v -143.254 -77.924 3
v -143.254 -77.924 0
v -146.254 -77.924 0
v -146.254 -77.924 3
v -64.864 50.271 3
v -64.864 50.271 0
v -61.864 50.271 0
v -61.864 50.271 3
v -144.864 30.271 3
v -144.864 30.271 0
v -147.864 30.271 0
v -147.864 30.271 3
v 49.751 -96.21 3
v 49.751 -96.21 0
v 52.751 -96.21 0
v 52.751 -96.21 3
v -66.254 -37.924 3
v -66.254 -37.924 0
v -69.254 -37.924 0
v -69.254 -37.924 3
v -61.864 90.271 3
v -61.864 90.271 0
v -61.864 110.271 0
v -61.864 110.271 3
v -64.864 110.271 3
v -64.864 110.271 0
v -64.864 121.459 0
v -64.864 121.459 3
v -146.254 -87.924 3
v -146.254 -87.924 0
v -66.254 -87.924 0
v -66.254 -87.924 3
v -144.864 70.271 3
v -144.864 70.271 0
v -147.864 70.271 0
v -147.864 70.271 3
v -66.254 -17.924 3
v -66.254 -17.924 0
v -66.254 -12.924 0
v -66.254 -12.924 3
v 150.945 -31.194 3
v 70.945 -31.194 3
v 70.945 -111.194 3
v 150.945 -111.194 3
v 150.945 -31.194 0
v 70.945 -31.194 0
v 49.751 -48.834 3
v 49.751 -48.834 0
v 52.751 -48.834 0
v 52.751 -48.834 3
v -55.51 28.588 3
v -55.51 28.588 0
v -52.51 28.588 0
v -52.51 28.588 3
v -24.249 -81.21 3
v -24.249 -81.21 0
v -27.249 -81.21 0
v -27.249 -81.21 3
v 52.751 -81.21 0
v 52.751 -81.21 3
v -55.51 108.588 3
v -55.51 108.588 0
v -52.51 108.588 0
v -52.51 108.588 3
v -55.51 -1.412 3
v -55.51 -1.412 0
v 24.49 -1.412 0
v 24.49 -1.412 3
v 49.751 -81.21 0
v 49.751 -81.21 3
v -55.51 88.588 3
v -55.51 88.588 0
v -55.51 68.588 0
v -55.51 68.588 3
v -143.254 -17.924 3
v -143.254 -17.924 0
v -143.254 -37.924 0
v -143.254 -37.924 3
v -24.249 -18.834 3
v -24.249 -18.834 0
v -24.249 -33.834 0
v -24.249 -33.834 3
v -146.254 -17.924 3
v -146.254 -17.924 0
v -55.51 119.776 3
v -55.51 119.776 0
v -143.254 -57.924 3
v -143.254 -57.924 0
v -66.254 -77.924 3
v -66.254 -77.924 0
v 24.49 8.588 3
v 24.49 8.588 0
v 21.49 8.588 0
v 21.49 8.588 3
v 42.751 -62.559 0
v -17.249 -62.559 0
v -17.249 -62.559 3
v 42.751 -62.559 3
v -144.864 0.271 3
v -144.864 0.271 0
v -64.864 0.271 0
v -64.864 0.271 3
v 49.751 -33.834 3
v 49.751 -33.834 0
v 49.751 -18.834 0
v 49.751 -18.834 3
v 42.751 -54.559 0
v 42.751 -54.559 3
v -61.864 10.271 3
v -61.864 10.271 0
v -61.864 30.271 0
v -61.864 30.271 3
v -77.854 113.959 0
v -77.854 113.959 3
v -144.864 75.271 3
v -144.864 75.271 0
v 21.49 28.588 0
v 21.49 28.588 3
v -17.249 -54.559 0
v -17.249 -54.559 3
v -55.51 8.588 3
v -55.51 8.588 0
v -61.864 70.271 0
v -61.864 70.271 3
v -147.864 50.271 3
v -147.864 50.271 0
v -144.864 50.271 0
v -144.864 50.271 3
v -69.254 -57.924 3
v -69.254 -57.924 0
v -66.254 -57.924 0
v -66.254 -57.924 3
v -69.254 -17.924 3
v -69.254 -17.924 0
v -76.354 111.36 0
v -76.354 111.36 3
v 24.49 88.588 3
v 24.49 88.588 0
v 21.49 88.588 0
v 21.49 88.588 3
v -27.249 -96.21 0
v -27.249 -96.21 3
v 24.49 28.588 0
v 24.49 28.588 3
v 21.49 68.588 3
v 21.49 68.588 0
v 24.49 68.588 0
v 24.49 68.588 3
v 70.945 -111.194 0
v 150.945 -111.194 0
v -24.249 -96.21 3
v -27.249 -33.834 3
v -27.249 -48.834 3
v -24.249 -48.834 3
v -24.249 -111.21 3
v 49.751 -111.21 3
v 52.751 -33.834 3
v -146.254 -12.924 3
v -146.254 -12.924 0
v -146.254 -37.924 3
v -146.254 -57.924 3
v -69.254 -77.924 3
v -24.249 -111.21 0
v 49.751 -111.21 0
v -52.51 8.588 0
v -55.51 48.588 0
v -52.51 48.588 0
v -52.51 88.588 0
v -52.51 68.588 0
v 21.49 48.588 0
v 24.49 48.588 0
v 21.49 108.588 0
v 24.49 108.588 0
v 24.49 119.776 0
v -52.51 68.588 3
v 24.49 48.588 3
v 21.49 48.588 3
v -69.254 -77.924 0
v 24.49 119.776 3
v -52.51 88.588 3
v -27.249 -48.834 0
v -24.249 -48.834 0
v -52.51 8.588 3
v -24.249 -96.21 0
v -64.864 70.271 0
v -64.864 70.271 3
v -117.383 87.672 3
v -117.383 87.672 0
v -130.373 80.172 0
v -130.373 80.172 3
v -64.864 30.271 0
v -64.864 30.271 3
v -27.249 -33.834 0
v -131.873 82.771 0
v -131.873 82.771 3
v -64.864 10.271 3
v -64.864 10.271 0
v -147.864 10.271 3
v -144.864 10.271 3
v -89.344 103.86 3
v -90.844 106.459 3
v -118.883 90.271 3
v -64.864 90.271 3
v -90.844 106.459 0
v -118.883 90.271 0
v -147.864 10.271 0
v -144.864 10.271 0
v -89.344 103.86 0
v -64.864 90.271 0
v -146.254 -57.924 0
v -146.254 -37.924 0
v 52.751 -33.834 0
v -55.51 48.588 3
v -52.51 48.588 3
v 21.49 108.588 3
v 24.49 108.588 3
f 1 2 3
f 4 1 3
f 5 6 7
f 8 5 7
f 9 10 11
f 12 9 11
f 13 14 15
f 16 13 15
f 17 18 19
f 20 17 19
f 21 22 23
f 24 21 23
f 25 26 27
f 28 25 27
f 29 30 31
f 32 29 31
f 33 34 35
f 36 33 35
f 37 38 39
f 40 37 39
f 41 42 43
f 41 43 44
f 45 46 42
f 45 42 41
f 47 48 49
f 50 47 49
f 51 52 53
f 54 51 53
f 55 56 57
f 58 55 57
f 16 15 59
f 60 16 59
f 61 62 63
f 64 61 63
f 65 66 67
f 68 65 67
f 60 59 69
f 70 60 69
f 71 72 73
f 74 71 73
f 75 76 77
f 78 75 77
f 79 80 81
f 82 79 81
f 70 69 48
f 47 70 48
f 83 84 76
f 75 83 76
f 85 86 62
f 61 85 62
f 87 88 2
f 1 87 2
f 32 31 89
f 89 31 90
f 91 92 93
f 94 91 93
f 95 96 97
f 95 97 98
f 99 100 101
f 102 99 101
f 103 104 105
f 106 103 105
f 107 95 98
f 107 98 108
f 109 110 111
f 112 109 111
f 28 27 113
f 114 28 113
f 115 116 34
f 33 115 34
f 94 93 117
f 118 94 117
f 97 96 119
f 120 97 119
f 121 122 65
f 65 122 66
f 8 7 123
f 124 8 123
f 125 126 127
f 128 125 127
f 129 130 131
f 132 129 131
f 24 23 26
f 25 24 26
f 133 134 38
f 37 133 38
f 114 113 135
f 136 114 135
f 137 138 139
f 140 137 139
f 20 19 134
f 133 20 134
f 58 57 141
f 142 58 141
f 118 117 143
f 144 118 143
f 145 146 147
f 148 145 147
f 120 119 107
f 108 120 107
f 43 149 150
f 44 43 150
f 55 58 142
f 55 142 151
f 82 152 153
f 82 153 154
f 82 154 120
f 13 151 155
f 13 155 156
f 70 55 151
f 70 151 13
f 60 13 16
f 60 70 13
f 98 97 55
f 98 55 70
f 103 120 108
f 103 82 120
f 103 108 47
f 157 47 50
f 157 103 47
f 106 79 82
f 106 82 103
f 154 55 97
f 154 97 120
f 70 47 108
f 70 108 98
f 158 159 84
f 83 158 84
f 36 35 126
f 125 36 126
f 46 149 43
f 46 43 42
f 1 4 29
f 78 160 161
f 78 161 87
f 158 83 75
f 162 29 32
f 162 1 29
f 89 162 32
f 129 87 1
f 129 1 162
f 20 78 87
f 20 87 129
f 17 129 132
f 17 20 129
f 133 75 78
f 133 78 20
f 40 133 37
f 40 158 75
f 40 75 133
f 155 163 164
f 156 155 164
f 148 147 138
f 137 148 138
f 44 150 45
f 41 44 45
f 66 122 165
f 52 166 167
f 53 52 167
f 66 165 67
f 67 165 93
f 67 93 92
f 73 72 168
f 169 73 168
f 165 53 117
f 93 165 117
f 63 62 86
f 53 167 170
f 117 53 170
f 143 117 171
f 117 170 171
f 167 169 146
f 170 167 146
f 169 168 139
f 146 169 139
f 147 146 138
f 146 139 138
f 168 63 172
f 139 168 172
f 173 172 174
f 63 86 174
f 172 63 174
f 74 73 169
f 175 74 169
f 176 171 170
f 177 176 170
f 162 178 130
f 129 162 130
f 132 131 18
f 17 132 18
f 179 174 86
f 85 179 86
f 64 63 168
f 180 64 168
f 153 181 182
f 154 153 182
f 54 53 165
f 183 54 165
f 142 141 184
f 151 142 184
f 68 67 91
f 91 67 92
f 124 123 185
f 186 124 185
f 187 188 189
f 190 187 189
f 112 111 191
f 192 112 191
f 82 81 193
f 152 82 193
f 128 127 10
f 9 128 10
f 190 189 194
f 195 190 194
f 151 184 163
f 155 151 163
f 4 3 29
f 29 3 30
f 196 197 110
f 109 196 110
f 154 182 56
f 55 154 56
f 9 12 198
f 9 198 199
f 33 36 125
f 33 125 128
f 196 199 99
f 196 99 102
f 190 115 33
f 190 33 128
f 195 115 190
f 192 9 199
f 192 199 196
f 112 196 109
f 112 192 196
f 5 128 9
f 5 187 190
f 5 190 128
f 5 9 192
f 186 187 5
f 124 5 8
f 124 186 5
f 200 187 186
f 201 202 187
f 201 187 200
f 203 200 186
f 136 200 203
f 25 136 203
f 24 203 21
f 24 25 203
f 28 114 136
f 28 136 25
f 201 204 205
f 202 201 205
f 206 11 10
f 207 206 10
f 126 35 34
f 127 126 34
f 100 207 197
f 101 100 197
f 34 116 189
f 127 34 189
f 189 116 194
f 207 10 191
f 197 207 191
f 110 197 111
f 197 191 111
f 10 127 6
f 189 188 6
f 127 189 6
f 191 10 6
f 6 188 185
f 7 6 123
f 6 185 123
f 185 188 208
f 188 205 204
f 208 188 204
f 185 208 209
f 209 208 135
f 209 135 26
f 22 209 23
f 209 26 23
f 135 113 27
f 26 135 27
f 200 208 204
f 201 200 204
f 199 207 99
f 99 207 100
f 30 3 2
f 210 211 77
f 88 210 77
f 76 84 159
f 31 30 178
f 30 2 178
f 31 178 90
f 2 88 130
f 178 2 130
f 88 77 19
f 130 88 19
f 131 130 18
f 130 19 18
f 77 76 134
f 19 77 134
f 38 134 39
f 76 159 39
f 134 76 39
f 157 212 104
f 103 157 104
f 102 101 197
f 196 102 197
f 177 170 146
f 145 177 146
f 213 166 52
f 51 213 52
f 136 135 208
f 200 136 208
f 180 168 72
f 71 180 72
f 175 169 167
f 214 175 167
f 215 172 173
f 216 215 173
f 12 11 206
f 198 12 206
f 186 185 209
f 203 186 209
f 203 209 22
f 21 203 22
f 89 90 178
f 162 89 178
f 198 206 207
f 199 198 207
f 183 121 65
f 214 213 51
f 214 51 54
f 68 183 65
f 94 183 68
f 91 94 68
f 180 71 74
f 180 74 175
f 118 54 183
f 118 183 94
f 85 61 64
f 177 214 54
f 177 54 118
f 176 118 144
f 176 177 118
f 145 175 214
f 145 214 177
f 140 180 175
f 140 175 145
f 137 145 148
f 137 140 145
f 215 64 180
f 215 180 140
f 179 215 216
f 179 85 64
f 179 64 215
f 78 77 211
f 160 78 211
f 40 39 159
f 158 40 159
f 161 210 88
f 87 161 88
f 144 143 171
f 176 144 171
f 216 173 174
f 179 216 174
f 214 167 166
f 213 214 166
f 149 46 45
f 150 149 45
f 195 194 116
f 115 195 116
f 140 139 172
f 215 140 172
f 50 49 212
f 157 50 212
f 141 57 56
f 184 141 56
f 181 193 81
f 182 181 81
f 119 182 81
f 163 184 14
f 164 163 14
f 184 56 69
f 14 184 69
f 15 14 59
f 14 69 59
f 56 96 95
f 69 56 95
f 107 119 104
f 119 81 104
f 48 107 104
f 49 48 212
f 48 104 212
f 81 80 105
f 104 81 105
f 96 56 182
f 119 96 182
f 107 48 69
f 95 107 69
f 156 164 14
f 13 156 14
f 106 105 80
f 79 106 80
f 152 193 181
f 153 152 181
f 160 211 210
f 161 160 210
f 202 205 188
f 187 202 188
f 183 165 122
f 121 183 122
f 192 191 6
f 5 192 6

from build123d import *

# Parameters (mm, degrees)
F0_W     = 60
F0_H     = 8
F0_W_2   = 80
F0_H_2   = 80
F1_DEPTH = 3


with BuildPart() as f1:
    # F0 (on Top) → F1 (new body)
    with BuildSketch(Plane.XY):
        Polygon((-131.87333, 82.770537), (-144.863711, 75.270537), (-144.863711, 70.270537), (-147.863711, 70.270537), (-147.863711, 50.270537), (-144.863711, 50.270537), (-144.863711, 30.270537), (-147.863711, 30.270537), (-147.863711, 10.270537), (-144.863711, 10.270537), (-144.863711, 0.270537), (-64.863711, 0.270537), (-64.863711, 10.270537), (-61.863711, 10.270537), (-61.863711, 30.270537), (-64.863711, 30.270537), (-64.863711, 50.270537), (-61.863711, 50.270537), (-61.863711, 70.270537), (-64.863711, 70.270537), (-64.863711, 90.270537), (-61.863711, 90.270537), (-61.863711, 110.270537), (-64.863711, 110.270537), (-64.863711, 121.458559), (-77.854092, 113.958559), (-76.354092, 111.360483), (-89.344473, 103.860483), (-90.844473, 106.458559), (-118.882949, 90.270537), (-117.382949, 87.672461), (-130.37333, 80.172461), align=None)
        Polygon((24.48994, 119.776082), (-55.51006, 119.776082), (-55.51006, 108.58806), (-52.51006, 108.58806), (-52.51006, 88.58806), (-55.51006, 88.58806), (-55.51006, 68.58806), (-52.51006, 68.58806), (-52.51006, 48.58806), (-55.51006, 48.58806), (-55.51006, 28.58806), (-52.51006, 28.58806), (-52.51006, 8.58806), (-55.51006, 8.58806), (-55.51006, -1.41194), (24.48994, -1.41194), (24.48994, 8.58806), (21.48994, 8.58806), (21.48994, 28.58806), (24.48994, 28.58806), (24.48994, 48.58806), (21.48994, 48.58806), (21.48994, 68.58806), (24.48994, 68.58806), (24.48994, 88.58806), (21.48994, 88.58806), (21.48994, 108.58806), (24.48994, 108.58806), align=None)
        Polygon((-66.254191, -12.924335), (-146.254191, -12.924335), (-146.254191, -17.924335), (-143.254191, -17.924335), (-143.254191, -37.924335), (-146.254191, -37.924335), (-146.254191, -57.924335), (-143.254191, -57.924335), (-143.254191, -77.924335), (-146.254191, -77.924335), (-146.254191, -87.924335), (-66.254191, -87.924335), (-66.254191, -77.924335), (-69.254191, -77.924335), (-69.254191, -57.924335), (-66.254191, -57.924335), (-66.254191, -37.924335), (-69.254191, -37.924335), (-69.254191, -17.924335), (-66.254191, -17.924335), align=None)
        Polygon((49.751045, -18.834406), (-24.248955, -18.834406), (-24.248955, -33.834406), (-27.248955, -33.834406), (-27.248955, -48.834406), (-24.248955, -48.834406), (-24.248955, -81.210449), (-27.248955, -81.210449), (-27.248955, -96.210449), (-24.248955, -96.210449), (-24.248955, -111.210449), (49.751045, -111.210449), (49.751045, -96.210449), (52.751045, -96.210449), (52.751045, -81.210449), (49.751045, -81.210449), (49.751045, -48.834406), (52.751045, -48.834406), (52.751045, -33.834406), (49.751045, -33.834406), align=None)
        with Locations((12.751045, -58.559041)):
            Rectangle(F0_W, F0_H, mode=Mode.SUBTRACT)
        with Locations((110.945315, -71.193888)):
            Rectangle(F0_W_2, F0_H_2)
    extrude(amount=F1_DEPTH)


solid = f1.part
